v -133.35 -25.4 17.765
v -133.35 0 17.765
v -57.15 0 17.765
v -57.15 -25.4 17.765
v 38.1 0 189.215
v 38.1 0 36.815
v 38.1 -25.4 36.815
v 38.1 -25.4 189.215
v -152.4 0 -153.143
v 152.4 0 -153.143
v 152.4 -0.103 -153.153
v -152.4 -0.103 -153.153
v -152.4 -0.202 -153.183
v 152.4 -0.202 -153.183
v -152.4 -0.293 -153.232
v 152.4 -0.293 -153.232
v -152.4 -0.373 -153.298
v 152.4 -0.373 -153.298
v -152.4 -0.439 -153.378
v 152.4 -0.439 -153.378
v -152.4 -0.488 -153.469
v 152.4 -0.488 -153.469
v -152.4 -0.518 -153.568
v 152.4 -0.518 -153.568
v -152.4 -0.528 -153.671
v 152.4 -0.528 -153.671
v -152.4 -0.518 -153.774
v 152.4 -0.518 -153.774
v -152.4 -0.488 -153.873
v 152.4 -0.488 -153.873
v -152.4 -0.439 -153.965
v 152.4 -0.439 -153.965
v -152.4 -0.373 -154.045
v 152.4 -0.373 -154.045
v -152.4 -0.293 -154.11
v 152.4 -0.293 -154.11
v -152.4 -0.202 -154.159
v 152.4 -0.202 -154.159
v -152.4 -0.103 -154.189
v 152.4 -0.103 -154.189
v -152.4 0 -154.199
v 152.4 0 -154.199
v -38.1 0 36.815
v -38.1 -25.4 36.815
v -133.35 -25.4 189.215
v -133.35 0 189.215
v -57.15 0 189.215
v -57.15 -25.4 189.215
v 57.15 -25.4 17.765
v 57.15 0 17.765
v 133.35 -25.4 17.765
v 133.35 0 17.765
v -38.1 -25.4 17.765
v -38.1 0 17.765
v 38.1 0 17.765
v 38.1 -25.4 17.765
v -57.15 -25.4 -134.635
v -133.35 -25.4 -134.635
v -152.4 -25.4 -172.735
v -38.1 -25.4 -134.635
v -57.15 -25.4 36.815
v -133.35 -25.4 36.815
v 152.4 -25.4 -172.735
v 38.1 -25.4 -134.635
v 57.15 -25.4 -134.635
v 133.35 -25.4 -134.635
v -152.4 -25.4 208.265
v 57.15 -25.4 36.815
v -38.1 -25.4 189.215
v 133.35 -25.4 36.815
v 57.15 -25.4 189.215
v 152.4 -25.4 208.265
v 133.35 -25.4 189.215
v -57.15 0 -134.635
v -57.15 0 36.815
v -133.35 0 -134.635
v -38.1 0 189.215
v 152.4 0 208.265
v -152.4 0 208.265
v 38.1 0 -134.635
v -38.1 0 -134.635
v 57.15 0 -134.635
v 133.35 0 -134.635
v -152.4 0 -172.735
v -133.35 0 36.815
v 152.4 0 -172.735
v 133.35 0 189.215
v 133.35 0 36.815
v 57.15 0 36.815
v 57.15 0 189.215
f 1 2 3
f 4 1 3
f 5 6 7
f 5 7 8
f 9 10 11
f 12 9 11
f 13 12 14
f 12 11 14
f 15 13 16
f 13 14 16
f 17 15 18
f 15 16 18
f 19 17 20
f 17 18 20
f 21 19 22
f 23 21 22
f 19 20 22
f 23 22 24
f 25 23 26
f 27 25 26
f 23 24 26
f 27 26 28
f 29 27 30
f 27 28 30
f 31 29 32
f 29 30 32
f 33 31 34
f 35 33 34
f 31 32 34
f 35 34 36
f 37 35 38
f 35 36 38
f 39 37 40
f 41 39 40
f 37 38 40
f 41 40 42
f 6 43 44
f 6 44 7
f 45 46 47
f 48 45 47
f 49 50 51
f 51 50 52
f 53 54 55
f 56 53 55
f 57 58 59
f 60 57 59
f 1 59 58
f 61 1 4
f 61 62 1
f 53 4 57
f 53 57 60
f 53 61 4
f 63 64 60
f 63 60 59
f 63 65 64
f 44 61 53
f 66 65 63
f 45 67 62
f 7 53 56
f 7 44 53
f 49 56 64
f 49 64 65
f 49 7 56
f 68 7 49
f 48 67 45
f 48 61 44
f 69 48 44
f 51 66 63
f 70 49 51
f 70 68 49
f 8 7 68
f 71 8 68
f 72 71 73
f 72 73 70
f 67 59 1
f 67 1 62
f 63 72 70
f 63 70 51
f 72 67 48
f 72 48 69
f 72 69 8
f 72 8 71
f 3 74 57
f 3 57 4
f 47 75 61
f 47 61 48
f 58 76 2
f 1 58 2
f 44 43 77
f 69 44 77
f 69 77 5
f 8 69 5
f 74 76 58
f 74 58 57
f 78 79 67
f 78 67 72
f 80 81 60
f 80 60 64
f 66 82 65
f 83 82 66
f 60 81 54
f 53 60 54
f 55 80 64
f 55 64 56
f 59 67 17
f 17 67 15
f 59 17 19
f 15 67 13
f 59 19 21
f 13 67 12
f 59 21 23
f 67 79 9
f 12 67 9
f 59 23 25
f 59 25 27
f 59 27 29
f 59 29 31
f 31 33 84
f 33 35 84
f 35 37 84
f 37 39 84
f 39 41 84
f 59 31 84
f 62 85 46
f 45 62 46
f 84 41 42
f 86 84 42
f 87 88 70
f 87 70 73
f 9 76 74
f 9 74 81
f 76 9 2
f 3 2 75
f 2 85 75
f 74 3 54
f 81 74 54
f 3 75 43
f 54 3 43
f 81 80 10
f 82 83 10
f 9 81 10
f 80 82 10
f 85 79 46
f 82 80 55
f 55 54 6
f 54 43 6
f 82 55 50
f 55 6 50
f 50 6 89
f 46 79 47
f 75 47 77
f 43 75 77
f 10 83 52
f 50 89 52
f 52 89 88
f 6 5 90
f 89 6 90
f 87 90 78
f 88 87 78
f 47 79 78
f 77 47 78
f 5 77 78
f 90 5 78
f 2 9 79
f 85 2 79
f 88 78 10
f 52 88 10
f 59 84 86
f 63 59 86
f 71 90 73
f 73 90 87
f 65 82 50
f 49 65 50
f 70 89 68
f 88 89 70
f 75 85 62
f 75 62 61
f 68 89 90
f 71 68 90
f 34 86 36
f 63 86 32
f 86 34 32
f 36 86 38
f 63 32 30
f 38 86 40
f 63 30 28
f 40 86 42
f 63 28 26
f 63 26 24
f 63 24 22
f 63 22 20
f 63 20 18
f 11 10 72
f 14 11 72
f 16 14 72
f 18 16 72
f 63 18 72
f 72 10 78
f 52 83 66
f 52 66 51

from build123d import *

# Parameters (mm, degrees)
F0_W     = 304.8
F0_H     = 361.95
F0_W_2   = 76.2
F0_H_2   = 152.4
F0_H_3   = 19.05
F1_DEPTH = 25.4
F3_DEPTH = 304.801


with BuildPart() as f1:
    # F0 (on Front) → F1 (new body)
    with BuildSketch(Plane.XZ):
        with Locations((0, 27.289911)):
            Rectangle(F0_W, F0_H)
        with Locations((-95.25, -58.435089)):
            Rectangle(F0_W_2, F0_H_2, mode=Mode.SUBTRACT)
        with Locations((0, -58.435089)):
            Rectangle(F0_W_2, F0_H_2, mode=Mode.SUBTRACT)
        with Locations((95.25, -58.435089)):
            Rectangle(F0_W_2, F0_H_2, mode=Mode.SUBTRACT)
        with Locations((-95.25, 113.014911)):
            Rectangle(F0_W_2, F0_H_2, mode=Mode.SUBTRACT)
        with Locations((0, 113.014911)):
            Rectangle(F0_W_2, F0_H_2, mode=Mode.SUBTRACT)
        with Locations((95.25, 113.014911)):
            Rectangle(F0_W_2, F0_H_2, mode=Mode.SUBTRACT)
        with Locations((0, -163.210089)):
            Rectangle(F0_W, F0_H_3)
    extrude(amount=F1_DEPTH)

    # F2 (on face) → F3 (cut, through all)
    with BuildSketch(Plane.YZ.offset(152.4)):
        with BuildLine():
            Line((0, -154.19948), (0, -153.143139))
            ThreePointArc((0, -153.143139), (-0.52817, -153.671309), (0, -154.19948))
        make_face()
    extrude(amount=-F3_DEPTH, mode=Mode.SUBTRACT)


solid = f1.part
